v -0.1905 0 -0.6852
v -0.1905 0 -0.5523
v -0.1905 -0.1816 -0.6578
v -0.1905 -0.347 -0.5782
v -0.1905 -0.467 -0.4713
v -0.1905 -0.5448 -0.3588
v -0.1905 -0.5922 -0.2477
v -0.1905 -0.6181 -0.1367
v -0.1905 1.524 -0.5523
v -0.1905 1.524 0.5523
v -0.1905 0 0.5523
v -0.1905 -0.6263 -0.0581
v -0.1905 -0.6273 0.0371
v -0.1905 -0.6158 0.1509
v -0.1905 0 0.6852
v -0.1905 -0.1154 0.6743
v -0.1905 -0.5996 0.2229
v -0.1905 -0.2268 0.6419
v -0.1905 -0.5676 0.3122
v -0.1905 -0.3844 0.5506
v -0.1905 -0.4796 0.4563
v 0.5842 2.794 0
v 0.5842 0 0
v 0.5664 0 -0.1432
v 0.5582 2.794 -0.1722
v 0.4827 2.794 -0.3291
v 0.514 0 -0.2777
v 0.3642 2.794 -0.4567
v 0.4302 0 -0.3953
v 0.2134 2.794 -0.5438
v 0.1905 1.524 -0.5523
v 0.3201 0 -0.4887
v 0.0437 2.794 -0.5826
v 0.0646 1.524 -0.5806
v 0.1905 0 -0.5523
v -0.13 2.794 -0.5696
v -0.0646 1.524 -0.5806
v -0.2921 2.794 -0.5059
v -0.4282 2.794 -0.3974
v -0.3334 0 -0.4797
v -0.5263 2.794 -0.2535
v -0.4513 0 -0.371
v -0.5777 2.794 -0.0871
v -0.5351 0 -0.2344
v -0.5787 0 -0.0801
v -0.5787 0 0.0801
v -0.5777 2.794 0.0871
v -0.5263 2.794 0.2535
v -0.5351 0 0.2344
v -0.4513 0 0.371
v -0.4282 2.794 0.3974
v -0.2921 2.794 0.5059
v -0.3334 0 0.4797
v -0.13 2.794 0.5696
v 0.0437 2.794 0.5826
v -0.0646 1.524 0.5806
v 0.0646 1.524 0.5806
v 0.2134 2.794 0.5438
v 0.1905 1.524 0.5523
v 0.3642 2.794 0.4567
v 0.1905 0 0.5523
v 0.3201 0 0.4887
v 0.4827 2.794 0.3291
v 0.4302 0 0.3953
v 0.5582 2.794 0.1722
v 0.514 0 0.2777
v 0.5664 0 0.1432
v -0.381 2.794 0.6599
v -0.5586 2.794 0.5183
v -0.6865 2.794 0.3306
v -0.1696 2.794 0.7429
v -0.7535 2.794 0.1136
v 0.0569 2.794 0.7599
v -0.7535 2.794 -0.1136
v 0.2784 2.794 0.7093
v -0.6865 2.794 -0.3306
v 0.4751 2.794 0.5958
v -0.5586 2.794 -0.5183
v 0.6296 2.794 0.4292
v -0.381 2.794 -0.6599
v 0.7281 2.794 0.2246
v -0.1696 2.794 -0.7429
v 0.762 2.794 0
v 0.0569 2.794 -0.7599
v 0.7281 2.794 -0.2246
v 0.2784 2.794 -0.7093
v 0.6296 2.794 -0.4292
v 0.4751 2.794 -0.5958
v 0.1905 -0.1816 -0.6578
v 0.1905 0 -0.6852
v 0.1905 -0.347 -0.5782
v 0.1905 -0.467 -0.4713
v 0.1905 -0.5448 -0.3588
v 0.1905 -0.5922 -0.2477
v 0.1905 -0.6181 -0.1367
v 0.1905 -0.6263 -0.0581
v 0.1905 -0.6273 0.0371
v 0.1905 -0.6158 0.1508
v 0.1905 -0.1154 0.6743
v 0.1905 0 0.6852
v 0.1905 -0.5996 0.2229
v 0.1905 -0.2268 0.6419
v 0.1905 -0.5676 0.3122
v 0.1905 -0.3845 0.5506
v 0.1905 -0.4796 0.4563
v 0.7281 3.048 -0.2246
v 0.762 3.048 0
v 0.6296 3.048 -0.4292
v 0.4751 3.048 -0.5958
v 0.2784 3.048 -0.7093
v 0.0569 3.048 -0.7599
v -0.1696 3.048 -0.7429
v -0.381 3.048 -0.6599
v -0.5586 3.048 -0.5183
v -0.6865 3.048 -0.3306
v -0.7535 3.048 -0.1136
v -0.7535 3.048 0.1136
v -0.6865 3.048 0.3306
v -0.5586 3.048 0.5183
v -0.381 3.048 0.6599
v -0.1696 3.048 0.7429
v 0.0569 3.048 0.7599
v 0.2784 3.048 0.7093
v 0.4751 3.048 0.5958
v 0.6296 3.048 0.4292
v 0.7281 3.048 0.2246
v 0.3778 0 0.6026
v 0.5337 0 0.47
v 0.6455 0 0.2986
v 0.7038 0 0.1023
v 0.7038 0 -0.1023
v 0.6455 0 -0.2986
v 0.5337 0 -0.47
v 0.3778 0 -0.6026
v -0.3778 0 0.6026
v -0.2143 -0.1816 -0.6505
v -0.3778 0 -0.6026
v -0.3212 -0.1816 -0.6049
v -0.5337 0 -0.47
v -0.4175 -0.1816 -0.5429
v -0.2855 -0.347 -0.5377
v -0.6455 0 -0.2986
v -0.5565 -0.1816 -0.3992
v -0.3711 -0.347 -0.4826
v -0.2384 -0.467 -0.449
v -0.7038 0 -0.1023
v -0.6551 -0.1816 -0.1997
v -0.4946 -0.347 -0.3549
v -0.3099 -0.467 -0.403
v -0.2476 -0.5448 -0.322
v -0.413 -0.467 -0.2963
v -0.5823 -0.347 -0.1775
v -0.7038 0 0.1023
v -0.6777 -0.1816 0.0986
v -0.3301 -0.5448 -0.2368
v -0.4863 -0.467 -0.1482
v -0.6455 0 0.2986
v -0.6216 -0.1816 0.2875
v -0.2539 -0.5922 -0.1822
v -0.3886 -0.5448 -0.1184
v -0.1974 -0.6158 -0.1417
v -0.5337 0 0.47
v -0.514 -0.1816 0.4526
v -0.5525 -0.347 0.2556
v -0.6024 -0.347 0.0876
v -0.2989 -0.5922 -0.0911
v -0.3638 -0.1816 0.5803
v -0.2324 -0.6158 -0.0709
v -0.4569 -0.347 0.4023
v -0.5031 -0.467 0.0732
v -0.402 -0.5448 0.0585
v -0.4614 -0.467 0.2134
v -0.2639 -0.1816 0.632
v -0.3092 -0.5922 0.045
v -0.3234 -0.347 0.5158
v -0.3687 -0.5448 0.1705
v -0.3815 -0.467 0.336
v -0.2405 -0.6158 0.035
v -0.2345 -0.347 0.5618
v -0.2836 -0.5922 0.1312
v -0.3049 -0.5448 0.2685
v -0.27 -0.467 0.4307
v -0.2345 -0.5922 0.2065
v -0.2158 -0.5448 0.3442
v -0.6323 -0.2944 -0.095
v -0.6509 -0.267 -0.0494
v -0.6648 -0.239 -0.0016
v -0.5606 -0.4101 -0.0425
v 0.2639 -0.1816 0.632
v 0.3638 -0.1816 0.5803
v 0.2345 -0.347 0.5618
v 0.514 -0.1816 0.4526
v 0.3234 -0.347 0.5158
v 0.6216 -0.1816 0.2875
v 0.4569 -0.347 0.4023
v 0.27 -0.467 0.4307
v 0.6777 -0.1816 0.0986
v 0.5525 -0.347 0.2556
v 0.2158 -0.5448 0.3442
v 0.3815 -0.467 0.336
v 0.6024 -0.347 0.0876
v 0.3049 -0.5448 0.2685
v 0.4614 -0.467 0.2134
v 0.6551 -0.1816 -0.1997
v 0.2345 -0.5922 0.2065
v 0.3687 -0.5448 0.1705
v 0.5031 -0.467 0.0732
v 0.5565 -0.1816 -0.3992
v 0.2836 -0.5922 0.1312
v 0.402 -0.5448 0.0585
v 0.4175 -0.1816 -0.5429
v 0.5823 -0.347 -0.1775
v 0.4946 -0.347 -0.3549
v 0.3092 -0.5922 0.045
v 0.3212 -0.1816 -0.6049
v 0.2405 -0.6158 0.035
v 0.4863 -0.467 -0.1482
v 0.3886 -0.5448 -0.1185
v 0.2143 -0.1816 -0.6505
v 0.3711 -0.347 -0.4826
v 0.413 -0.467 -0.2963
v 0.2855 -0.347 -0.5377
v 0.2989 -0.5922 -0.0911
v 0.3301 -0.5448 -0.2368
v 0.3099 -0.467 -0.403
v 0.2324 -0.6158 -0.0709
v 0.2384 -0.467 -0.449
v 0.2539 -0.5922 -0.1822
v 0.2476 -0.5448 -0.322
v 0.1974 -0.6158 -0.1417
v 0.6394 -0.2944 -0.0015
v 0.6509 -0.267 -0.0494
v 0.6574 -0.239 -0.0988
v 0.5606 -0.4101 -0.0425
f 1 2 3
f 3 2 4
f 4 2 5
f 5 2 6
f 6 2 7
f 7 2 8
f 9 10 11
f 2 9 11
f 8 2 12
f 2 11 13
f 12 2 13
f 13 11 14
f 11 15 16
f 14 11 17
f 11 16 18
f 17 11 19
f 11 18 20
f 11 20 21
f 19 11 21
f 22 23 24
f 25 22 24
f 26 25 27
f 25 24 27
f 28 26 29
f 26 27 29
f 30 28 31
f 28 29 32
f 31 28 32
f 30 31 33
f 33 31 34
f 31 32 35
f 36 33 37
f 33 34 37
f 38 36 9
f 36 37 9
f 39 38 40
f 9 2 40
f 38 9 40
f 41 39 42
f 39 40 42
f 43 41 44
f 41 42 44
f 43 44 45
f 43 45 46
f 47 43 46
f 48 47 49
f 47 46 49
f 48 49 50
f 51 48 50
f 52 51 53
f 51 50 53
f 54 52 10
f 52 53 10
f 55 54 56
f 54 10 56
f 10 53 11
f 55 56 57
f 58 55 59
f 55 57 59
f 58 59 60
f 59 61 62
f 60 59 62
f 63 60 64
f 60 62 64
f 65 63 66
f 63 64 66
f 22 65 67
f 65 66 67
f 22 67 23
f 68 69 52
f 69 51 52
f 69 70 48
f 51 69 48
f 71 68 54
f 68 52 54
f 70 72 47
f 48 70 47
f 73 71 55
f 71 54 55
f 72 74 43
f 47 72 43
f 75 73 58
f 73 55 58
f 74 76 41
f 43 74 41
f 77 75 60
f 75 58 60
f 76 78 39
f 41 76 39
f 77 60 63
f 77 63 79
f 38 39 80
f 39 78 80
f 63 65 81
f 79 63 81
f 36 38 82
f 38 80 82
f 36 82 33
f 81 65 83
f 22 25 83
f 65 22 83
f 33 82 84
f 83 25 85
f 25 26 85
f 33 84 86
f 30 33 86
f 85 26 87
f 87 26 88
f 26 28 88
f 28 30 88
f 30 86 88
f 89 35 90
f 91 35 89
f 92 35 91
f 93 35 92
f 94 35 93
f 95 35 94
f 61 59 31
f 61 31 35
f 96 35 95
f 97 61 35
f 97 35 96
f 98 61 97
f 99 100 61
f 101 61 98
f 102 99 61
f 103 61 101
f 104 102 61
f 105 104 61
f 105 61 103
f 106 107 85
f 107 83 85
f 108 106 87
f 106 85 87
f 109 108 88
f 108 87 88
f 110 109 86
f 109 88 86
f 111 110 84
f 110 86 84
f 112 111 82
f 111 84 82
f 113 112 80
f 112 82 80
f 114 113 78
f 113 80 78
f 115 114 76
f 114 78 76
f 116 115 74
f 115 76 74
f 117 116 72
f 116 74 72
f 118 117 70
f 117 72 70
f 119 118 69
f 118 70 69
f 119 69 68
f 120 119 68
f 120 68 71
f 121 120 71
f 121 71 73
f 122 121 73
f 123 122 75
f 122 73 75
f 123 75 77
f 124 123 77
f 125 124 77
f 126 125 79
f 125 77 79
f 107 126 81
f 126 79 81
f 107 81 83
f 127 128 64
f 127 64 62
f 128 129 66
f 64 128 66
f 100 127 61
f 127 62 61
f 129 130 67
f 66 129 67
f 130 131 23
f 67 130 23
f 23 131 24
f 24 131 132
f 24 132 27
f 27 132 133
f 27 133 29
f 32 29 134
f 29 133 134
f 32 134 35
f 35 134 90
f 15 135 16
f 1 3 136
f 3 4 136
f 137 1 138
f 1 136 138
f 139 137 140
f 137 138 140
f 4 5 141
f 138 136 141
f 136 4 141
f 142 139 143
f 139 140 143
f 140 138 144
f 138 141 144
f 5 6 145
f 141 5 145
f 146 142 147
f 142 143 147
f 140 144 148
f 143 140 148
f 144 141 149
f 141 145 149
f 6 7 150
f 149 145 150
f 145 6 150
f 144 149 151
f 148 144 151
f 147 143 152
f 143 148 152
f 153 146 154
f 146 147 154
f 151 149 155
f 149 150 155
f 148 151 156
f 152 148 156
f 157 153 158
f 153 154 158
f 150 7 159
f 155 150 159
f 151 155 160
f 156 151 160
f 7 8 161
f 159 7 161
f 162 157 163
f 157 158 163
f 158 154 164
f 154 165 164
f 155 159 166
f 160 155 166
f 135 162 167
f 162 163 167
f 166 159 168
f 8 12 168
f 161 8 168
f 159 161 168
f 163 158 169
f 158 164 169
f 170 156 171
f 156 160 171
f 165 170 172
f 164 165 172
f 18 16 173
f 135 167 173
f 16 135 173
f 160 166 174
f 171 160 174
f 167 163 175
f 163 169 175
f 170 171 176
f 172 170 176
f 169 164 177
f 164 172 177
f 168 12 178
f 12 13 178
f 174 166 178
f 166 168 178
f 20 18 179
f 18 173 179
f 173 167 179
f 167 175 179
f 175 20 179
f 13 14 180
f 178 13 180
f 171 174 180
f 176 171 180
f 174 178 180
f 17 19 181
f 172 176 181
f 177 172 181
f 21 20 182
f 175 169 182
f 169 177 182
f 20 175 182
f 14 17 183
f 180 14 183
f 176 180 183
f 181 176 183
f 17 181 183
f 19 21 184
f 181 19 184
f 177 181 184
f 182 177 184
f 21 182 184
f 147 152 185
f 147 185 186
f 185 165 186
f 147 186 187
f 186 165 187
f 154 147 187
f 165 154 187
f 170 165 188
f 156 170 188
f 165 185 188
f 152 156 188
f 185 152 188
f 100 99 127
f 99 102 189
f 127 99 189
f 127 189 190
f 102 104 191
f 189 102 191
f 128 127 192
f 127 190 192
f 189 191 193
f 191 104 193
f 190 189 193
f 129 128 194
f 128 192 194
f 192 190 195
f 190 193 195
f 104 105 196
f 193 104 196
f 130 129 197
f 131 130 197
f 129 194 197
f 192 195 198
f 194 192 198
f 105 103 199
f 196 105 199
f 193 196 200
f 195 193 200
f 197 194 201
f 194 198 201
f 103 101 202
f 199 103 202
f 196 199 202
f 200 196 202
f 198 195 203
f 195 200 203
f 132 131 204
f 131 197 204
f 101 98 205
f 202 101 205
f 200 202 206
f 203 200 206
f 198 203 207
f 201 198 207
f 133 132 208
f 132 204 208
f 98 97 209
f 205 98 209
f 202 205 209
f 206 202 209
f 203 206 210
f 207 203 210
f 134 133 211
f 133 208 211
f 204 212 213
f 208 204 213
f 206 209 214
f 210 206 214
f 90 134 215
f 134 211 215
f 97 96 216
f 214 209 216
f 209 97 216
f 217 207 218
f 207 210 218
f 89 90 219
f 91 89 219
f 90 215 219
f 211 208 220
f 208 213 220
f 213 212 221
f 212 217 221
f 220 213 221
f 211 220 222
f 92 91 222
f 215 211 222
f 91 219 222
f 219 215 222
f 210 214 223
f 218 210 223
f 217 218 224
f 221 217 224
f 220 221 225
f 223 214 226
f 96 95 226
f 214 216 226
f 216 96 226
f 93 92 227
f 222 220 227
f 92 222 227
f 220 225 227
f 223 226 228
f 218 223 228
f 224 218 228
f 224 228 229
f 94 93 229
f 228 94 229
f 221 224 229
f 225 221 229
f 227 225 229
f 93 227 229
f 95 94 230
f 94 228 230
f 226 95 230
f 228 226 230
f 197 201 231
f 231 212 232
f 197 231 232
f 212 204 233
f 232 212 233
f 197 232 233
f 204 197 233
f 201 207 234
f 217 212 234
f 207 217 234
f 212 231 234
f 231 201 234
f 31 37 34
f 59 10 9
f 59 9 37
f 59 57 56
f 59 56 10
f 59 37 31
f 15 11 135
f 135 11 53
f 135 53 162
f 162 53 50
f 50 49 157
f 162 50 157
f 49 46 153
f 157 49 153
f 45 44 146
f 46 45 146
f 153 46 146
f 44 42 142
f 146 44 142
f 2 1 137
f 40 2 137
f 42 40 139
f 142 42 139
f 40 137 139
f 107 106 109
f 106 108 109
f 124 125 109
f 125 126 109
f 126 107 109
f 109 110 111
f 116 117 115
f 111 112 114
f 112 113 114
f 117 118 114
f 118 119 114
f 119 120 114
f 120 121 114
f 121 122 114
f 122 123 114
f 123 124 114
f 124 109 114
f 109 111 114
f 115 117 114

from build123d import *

# Parameters (mm, degrees)
CUT_EXTRUDE11_DEPTH = 1.27


with BuildPart() as part:
    # Sketch1 → Revolve1 (revolve)
    with BuildSketch(Plane.XY):
        with BuildLine():
            Line((0, 0), (0, 3.048))
            Line((0, 3.048), (0.762, 3.048))
            Line((0.762, 3.048), (0.762, 2.794))
            Line((0.762, 2.794), (0.5842, 2.794))
            Line((0.5842, 2.794), (0.5842, 0))
            Line((0.5842, 0), (0.7112, 0))
            ThreePointArc((0.7112, 0), (0.497756642, -0.476715439), (0, -0.635))
            Line((0, -0.635), (0, 0))
        make_face()
    revolve(axis=Axis((0, -1000, 0), (0, 1, 0)))

    # Sketch4 → Cut-Extrude11 (cut, symmetric)
    with BuildSketch(Plane.XY):
        Polygon((-0.1905, 0), (-0.1905, 1.524), (0.1905, 1.524), (0.1905, -0.6604), (-0.1905, -0.6604), align=None)
    extrude(amount=CUT_EXTRUDE11_DEPTH, both=True, mode=Mode.SUBTRACT)


solid = part.part
